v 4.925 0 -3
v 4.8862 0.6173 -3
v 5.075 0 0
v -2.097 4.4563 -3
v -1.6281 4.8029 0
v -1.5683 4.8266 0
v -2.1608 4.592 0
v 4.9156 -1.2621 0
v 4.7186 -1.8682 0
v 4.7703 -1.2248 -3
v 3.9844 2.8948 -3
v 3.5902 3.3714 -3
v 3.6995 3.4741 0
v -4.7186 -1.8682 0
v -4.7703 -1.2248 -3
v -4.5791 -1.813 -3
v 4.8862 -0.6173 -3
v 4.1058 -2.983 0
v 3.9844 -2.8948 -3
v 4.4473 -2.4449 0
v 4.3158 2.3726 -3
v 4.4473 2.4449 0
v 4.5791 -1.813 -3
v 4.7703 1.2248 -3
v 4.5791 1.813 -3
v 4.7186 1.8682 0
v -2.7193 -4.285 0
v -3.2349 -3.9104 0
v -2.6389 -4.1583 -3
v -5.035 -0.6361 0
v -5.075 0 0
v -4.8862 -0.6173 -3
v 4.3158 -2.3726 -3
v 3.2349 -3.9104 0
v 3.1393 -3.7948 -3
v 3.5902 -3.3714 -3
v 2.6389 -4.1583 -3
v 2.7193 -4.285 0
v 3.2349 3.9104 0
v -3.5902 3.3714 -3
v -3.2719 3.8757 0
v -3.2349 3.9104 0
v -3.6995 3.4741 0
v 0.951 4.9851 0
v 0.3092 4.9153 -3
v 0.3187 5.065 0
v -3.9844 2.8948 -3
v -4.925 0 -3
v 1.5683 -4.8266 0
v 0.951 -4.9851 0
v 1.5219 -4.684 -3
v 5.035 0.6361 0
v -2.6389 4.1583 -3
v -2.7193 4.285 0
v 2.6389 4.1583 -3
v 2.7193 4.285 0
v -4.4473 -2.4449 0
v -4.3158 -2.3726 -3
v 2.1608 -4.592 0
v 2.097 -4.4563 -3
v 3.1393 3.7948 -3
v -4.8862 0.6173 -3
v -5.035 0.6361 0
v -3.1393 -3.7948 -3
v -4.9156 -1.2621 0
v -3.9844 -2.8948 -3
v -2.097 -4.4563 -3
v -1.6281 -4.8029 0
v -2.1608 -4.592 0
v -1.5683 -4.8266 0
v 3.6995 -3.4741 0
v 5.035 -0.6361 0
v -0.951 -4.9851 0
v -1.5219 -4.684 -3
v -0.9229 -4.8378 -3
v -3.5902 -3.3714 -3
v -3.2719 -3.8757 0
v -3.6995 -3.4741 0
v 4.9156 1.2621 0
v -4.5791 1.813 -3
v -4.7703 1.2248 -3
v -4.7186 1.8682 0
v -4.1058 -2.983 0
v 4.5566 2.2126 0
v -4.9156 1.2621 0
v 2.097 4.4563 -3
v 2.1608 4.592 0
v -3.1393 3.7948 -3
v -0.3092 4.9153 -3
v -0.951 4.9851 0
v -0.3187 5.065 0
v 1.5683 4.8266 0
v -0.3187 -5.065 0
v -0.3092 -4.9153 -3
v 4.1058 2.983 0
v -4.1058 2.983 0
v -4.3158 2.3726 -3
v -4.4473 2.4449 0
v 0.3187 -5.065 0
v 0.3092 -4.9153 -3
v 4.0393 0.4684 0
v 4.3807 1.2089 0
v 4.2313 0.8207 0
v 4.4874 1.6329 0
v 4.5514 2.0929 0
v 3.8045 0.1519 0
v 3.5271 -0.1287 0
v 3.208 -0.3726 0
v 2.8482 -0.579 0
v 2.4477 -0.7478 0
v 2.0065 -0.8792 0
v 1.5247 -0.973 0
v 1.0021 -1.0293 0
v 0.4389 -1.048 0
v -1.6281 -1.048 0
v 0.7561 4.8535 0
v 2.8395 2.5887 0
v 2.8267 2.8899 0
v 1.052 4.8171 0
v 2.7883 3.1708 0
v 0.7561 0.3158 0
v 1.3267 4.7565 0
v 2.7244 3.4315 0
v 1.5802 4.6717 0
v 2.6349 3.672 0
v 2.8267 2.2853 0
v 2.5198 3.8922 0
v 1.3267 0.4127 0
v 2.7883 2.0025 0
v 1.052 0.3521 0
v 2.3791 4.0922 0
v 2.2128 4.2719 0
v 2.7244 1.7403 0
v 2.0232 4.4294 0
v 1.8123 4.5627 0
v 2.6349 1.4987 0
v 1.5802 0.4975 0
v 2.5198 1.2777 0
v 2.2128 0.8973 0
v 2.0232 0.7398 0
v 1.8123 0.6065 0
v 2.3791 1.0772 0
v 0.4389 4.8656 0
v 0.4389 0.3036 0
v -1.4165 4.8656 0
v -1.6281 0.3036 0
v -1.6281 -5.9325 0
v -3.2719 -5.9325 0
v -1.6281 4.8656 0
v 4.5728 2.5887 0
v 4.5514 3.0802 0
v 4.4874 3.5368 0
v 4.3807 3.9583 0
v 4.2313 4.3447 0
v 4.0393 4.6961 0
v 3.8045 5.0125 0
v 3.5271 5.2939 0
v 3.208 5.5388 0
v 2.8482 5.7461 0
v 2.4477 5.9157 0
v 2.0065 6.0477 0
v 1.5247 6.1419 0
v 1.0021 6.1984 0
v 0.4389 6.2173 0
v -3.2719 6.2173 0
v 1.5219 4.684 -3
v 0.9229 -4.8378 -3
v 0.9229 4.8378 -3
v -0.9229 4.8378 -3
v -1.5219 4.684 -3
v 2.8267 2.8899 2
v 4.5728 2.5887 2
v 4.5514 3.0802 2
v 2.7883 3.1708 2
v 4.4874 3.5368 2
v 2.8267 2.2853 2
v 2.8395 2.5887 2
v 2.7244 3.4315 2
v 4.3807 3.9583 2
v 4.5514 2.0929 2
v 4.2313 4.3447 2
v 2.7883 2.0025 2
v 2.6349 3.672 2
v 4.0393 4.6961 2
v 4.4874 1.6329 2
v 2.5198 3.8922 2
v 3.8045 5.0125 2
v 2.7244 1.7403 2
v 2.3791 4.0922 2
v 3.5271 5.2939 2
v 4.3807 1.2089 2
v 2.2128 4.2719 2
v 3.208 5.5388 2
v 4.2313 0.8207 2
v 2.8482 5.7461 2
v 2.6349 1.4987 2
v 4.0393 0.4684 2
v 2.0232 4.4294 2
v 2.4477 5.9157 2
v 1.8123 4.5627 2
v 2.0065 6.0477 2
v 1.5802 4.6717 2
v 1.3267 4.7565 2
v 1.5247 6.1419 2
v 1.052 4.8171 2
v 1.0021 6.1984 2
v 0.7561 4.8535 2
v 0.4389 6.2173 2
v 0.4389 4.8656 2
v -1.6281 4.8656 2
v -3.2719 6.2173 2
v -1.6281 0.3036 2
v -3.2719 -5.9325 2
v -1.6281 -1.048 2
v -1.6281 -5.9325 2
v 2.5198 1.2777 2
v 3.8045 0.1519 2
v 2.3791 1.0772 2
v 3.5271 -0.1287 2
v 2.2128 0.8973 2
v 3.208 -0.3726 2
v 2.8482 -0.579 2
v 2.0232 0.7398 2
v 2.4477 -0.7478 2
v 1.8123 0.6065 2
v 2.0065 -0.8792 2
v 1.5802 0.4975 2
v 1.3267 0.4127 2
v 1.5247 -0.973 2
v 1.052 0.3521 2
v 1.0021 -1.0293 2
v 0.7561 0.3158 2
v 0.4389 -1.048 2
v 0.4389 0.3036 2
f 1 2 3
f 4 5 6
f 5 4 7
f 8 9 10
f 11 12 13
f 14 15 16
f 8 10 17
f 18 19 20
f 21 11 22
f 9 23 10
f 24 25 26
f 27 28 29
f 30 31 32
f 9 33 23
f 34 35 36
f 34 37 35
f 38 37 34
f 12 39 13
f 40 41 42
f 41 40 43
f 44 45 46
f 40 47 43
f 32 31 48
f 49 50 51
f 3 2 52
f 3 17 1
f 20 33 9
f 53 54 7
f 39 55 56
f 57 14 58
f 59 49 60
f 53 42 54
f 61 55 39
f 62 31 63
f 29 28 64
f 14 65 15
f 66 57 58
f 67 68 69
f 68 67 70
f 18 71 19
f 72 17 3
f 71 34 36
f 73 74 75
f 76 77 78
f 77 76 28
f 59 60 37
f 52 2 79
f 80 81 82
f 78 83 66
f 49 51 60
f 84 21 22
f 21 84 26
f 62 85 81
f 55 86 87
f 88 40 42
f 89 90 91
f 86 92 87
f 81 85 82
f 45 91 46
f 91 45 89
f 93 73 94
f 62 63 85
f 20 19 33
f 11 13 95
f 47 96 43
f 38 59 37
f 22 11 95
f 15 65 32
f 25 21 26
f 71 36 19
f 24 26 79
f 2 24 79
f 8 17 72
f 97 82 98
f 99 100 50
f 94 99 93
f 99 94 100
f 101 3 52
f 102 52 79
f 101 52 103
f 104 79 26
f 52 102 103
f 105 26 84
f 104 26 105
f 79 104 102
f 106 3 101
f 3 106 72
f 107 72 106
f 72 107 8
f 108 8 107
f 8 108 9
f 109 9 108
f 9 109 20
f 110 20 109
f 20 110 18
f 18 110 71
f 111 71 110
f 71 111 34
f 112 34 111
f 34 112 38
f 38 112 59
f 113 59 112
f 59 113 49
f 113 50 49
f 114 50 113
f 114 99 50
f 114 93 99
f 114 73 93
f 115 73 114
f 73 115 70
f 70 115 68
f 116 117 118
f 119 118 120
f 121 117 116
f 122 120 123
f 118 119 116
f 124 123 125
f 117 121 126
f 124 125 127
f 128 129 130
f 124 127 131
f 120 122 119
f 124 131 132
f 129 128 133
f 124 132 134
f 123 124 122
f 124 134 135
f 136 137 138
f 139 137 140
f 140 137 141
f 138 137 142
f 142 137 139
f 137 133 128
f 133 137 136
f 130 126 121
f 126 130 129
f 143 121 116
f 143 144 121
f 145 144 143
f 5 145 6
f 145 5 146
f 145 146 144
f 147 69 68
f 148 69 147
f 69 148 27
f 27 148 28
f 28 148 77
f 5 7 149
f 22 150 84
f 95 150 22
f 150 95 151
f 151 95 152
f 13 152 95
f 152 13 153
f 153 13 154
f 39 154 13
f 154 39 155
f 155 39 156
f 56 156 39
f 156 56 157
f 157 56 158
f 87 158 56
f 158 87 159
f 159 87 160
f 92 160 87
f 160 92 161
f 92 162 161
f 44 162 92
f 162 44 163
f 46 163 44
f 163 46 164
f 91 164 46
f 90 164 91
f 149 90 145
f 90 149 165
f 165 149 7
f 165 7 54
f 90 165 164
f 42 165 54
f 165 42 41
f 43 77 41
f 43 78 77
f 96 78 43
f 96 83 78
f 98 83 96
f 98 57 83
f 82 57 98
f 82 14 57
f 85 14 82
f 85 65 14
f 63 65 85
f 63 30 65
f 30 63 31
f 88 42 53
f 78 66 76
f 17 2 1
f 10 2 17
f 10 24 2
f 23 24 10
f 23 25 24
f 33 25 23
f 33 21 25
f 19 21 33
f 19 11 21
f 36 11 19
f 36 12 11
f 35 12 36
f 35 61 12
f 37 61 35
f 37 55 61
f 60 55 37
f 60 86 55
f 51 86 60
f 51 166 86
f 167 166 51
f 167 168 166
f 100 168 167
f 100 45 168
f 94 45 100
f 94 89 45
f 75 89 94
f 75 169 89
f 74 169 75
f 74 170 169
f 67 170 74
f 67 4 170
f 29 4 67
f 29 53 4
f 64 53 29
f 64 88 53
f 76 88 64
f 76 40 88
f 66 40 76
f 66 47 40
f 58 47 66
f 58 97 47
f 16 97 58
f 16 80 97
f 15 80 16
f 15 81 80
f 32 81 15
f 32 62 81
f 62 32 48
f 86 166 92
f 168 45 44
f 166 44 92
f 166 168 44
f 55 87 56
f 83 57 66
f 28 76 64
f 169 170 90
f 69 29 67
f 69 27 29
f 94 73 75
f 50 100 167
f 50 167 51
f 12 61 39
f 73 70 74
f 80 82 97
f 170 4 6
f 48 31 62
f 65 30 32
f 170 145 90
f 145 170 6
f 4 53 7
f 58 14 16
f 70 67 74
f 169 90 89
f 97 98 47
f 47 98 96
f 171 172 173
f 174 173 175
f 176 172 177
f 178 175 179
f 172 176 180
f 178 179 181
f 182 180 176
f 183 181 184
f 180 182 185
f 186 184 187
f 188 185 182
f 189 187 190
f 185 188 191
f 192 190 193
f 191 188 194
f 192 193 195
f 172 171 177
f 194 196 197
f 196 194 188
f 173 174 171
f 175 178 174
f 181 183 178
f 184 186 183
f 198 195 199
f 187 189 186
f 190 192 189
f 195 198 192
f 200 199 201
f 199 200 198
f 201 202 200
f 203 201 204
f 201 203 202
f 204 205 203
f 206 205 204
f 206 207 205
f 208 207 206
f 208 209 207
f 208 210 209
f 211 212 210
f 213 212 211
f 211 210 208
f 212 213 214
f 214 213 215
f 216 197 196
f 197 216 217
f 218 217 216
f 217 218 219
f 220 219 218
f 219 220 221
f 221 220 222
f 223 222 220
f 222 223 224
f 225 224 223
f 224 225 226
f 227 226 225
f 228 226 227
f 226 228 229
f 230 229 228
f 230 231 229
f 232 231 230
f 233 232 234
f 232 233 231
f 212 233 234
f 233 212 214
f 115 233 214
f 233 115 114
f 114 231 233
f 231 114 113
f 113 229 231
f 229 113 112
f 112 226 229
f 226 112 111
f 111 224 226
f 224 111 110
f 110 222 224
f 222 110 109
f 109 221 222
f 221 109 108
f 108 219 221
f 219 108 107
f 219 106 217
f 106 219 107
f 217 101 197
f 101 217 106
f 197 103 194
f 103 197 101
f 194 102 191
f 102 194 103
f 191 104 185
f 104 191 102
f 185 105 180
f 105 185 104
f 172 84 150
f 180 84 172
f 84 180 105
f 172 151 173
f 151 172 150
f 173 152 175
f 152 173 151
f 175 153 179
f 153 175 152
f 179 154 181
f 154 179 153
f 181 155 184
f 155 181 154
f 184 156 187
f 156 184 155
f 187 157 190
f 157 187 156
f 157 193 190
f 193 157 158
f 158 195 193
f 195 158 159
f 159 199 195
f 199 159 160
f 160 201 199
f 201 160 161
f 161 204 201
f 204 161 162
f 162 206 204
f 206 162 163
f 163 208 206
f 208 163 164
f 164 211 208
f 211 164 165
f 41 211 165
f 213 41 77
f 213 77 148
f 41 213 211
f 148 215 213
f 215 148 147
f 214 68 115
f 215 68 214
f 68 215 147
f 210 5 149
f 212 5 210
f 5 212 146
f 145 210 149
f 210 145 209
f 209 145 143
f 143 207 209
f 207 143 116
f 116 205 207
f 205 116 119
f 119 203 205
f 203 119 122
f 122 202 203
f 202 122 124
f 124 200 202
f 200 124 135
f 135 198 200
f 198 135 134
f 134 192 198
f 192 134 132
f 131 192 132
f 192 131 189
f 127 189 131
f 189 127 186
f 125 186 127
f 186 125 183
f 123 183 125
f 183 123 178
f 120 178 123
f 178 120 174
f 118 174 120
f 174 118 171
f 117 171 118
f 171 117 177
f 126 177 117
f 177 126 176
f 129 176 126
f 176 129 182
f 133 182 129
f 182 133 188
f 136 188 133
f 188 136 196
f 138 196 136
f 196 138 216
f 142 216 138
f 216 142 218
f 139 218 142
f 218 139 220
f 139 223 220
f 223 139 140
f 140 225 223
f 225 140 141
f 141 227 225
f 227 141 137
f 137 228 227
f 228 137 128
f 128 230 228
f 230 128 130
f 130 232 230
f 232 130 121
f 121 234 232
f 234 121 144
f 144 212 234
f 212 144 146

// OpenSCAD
$fn = 50;


difference() {
	union() {
		translate(v = [0, 0, -3.0000000000]) {
			cylinder(h = 3, r1 = 4.9250000000, r2 = 5.0750000000);
		}
		linear_extrude(height = 2) {
			text(font = "Impact", halign = "center", size = 12, text = "P", valign = "center");
		}
	}
	union();
}
